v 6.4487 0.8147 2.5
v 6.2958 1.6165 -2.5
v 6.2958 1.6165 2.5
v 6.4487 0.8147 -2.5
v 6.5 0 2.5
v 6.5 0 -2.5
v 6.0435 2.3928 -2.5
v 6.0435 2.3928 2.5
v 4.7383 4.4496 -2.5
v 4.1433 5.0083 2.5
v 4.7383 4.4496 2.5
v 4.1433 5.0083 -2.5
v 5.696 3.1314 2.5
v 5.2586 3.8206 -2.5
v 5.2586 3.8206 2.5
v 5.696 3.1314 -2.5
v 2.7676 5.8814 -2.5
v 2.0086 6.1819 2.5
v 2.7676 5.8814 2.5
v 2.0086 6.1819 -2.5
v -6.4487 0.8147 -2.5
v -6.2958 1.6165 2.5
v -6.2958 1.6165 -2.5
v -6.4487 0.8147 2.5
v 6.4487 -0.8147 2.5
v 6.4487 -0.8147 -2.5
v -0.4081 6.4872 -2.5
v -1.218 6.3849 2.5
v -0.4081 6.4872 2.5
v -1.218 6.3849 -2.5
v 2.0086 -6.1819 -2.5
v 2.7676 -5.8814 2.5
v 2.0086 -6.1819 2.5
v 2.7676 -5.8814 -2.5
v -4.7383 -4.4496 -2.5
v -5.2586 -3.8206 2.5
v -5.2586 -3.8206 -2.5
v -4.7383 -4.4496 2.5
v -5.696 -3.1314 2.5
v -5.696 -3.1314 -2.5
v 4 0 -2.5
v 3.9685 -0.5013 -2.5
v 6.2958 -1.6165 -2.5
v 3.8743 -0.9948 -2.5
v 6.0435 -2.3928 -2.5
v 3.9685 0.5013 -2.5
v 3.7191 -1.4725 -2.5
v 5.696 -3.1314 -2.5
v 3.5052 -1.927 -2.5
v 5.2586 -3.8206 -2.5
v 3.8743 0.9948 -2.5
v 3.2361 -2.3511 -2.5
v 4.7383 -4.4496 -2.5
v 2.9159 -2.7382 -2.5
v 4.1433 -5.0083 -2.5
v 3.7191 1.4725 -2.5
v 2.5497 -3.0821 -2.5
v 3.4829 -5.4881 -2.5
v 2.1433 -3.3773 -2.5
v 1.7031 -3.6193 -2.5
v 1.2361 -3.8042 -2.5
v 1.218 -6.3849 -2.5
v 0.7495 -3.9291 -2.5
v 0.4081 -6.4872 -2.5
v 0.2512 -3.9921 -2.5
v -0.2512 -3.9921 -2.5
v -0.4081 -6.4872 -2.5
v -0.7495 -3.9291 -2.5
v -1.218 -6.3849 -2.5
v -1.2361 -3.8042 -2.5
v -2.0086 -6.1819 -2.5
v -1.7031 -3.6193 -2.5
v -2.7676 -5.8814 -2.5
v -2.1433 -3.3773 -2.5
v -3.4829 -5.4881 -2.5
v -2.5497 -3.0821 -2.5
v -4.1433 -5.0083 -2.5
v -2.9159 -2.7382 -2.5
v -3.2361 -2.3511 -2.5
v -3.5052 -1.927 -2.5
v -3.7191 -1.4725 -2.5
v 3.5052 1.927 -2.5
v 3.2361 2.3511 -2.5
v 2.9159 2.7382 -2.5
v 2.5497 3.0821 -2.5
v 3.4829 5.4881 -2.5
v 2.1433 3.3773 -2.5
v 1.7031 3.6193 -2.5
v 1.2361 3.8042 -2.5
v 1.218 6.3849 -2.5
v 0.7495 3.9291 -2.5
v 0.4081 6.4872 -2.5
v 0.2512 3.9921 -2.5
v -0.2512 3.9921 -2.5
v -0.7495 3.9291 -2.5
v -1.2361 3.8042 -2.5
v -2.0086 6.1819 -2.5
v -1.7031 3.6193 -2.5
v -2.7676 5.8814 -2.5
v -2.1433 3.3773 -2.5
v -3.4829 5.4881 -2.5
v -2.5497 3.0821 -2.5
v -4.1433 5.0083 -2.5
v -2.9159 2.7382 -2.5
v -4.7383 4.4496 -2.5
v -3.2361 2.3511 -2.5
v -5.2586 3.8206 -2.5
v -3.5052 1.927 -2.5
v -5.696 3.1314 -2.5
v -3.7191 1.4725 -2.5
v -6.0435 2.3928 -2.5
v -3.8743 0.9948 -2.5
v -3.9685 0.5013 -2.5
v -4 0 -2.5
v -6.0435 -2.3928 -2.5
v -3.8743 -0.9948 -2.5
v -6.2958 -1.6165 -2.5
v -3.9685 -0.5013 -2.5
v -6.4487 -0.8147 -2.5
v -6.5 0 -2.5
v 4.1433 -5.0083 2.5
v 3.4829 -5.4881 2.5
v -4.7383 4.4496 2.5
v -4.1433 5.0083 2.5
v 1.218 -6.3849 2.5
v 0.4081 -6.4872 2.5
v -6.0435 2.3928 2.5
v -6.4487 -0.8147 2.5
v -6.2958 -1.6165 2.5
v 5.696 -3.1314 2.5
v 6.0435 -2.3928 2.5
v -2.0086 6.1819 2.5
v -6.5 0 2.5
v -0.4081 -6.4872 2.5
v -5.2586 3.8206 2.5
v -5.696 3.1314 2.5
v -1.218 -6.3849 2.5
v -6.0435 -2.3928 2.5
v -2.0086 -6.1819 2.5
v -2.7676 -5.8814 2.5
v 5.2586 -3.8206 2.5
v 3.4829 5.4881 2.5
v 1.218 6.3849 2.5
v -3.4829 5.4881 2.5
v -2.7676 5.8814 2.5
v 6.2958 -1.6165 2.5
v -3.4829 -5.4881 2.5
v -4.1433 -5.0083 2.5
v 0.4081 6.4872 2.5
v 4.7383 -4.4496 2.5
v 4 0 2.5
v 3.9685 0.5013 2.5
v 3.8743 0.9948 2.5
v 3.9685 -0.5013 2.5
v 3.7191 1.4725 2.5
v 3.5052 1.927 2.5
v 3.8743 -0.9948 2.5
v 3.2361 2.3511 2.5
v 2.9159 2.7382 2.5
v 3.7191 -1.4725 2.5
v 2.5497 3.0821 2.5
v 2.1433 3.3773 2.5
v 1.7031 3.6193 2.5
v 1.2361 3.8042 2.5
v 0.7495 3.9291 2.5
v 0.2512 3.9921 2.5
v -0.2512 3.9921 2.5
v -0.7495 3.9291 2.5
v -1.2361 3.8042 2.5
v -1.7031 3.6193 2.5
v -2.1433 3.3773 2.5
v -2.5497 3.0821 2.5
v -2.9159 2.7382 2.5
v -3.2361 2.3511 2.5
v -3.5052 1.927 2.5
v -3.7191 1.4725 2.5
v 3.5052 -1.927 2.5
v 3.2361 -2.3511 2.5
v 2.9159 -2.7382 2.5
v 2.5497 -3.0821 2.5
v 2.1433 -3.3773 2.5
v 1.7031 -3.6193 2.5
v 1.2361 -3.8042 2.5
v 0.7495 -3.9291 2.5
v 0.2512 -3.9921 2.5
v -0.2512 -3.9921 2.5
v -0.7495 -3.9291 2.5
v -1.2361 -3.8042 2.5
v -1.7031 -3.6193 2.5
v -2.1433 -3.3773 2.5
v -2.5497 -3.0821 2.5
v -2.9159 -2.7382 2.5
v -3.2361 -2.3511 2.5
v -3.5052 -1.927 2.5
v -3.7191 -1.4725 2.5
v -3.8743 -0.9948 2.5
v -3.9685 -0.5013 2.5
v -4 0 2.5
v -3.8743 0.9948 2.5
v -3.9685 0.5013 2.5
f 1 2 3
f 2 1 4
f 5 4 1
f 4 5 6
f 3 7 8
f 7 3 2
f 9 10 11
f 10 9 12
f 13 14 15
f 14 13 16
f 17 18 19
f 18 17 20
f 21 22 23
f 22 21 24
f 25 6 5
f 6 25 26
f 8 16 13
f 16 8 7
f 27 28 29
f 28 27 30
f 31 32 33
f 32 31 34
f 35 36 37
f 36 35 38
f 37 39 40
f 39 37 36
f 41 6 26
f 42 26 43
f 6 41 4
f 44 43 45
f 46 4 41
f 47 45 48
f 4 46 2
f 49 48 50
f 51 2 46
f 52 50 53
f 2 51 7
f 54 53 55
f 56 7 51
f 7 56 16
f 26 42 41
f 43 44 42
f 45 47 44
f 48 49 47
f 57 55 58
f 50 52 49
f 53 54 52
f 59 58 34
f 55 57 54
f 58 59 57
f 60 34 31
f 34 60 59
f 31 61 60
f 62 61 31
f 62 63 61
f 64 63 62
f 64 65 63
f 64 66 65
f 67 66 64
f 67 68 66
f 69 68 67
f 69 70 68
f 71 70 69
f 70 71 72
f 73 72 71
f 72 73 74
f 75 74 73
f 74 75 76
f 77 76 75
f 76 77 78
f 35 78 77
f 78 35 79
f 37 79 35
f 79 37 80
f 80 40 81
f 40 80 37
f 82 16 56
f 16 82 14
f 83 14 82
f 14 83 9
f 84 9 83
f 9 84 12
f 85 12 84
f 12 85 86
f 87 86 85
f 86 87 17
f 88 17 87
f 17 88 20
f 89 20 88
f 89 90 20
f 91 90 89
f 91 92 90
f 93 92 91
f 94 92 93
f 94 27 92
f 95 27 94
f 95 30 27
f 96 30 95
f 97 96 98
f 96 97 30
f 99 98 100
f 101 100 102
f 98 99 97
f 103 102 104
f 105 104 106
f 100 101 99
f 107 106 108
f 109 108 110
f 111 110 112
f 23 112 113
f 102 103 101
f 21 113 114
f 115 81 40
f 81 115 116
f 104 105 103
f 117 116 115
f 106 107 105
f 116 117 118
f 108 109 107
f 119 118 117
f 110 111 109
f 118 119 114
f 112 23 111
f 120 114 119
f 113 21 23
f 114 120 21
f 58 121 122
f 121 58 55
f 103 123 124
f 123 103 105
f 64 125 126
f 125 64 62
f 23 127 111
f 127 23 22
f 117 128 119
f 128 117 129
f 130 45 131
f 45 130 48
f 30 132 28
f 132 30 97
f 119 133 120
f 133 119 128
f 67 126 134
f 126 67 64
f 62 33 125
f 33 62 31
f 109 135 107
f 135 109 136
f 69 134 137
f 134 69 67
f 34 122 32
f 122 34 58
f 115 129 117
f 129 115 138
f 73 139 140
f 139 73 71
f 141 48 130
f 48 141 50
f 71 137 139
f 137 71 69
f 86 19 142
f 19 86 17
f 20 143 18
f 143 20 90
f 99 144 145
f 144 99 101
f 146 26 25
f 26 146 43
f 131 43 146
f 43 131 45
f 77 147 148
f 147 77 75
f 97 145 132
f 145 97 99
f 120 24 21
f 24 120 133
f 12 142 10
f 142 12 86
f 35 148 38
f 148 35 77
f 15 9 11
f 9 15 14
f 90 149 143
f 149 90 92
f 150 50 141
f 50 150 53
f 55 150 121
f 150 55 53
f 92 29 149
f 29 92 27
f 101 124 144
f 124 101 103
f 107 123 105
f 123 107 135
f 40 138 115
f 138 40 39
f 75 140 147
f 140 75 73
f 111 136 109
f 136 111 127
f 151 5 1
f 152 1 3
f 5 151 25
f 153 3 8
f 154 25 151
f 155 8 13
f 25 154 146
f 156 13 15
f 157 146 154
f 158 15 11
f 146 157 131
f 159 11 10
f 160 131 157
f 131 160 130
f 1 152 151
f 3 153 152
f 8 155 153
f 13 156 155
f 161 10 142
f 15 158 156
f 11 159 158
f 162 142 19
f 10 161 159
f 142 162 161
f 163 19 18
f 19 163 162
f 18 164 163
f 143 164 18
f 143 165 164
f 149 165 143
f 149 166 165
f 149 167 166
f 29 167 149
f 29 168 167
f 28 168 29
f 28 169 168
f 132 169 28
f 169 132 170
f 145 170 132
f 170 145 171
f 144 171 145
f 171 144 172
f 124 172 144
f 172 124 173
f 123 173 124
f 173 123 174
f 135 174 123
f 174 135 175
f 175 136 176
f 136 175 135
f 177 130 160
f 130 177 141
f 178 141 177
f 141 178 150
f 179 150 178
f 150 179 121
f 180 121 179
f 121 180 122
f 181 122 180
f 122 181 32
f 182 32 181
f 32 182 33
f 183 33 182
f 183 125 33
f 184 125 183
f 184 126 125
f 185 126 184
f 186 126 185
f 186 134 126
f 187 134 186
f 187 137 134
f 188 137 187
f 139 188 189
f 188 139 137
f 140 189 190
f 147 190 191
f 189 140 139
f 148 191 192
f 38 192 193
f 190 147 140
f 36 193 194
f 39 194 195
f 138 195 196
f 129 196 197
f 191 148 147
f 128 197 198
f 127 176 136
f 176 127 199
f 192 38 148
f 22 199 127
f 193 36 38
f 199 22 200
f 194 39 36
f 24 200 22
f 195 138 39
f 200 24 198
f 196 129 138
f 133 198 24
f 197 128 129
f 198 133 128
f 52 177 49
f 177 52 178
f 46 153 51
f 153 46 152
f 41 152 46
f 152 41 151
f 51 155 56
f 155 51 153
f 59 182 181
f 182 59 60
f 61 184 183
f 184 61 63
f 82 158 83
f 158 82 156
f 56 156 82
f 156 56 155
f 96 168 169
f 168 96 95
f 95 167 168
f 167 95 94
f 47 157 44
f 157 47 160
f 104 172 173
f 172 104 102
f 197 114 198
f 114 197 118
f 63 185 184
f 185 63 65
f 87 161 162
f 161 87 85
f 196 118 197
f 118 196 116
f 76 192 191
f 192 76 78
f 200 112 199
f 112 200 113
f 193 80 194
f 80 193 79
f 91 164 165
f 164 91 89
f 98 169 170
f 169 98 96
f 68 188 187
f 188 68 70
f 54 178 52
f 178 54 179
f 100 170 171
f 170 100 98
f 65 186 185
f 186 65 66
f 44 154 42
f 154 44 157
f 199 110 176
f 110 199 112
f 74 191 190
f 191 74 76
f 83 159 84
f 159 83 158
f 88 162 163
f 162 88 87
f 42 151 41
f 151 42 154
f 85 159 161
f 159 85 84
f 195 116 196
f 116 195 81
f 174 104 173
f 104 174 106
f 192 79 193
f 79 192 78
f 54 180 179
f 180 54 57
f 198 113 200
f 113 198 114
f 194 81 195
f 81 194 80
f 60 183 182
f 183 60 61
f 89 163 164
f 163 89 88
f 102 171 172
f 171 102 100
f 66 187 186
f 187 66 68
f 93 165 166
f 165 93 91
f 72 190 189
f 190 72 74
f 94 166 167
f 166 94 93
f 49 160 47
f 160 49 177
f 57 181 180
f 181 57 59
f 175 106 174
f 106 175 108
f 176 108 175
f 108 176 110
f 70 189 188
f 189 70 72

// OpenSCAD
$fn = 50;


difference() {
	union() {
		translate(v = [0, 0, -2.5000000000]) {
			cylinder(h = 5, r = 6.5000000000);
		}
	}
	union() {
		translate(v = [0, 0, -100.0000000000]) {
			cylinder(h = 200, r = 4.0000000000);
		}
	}
}
